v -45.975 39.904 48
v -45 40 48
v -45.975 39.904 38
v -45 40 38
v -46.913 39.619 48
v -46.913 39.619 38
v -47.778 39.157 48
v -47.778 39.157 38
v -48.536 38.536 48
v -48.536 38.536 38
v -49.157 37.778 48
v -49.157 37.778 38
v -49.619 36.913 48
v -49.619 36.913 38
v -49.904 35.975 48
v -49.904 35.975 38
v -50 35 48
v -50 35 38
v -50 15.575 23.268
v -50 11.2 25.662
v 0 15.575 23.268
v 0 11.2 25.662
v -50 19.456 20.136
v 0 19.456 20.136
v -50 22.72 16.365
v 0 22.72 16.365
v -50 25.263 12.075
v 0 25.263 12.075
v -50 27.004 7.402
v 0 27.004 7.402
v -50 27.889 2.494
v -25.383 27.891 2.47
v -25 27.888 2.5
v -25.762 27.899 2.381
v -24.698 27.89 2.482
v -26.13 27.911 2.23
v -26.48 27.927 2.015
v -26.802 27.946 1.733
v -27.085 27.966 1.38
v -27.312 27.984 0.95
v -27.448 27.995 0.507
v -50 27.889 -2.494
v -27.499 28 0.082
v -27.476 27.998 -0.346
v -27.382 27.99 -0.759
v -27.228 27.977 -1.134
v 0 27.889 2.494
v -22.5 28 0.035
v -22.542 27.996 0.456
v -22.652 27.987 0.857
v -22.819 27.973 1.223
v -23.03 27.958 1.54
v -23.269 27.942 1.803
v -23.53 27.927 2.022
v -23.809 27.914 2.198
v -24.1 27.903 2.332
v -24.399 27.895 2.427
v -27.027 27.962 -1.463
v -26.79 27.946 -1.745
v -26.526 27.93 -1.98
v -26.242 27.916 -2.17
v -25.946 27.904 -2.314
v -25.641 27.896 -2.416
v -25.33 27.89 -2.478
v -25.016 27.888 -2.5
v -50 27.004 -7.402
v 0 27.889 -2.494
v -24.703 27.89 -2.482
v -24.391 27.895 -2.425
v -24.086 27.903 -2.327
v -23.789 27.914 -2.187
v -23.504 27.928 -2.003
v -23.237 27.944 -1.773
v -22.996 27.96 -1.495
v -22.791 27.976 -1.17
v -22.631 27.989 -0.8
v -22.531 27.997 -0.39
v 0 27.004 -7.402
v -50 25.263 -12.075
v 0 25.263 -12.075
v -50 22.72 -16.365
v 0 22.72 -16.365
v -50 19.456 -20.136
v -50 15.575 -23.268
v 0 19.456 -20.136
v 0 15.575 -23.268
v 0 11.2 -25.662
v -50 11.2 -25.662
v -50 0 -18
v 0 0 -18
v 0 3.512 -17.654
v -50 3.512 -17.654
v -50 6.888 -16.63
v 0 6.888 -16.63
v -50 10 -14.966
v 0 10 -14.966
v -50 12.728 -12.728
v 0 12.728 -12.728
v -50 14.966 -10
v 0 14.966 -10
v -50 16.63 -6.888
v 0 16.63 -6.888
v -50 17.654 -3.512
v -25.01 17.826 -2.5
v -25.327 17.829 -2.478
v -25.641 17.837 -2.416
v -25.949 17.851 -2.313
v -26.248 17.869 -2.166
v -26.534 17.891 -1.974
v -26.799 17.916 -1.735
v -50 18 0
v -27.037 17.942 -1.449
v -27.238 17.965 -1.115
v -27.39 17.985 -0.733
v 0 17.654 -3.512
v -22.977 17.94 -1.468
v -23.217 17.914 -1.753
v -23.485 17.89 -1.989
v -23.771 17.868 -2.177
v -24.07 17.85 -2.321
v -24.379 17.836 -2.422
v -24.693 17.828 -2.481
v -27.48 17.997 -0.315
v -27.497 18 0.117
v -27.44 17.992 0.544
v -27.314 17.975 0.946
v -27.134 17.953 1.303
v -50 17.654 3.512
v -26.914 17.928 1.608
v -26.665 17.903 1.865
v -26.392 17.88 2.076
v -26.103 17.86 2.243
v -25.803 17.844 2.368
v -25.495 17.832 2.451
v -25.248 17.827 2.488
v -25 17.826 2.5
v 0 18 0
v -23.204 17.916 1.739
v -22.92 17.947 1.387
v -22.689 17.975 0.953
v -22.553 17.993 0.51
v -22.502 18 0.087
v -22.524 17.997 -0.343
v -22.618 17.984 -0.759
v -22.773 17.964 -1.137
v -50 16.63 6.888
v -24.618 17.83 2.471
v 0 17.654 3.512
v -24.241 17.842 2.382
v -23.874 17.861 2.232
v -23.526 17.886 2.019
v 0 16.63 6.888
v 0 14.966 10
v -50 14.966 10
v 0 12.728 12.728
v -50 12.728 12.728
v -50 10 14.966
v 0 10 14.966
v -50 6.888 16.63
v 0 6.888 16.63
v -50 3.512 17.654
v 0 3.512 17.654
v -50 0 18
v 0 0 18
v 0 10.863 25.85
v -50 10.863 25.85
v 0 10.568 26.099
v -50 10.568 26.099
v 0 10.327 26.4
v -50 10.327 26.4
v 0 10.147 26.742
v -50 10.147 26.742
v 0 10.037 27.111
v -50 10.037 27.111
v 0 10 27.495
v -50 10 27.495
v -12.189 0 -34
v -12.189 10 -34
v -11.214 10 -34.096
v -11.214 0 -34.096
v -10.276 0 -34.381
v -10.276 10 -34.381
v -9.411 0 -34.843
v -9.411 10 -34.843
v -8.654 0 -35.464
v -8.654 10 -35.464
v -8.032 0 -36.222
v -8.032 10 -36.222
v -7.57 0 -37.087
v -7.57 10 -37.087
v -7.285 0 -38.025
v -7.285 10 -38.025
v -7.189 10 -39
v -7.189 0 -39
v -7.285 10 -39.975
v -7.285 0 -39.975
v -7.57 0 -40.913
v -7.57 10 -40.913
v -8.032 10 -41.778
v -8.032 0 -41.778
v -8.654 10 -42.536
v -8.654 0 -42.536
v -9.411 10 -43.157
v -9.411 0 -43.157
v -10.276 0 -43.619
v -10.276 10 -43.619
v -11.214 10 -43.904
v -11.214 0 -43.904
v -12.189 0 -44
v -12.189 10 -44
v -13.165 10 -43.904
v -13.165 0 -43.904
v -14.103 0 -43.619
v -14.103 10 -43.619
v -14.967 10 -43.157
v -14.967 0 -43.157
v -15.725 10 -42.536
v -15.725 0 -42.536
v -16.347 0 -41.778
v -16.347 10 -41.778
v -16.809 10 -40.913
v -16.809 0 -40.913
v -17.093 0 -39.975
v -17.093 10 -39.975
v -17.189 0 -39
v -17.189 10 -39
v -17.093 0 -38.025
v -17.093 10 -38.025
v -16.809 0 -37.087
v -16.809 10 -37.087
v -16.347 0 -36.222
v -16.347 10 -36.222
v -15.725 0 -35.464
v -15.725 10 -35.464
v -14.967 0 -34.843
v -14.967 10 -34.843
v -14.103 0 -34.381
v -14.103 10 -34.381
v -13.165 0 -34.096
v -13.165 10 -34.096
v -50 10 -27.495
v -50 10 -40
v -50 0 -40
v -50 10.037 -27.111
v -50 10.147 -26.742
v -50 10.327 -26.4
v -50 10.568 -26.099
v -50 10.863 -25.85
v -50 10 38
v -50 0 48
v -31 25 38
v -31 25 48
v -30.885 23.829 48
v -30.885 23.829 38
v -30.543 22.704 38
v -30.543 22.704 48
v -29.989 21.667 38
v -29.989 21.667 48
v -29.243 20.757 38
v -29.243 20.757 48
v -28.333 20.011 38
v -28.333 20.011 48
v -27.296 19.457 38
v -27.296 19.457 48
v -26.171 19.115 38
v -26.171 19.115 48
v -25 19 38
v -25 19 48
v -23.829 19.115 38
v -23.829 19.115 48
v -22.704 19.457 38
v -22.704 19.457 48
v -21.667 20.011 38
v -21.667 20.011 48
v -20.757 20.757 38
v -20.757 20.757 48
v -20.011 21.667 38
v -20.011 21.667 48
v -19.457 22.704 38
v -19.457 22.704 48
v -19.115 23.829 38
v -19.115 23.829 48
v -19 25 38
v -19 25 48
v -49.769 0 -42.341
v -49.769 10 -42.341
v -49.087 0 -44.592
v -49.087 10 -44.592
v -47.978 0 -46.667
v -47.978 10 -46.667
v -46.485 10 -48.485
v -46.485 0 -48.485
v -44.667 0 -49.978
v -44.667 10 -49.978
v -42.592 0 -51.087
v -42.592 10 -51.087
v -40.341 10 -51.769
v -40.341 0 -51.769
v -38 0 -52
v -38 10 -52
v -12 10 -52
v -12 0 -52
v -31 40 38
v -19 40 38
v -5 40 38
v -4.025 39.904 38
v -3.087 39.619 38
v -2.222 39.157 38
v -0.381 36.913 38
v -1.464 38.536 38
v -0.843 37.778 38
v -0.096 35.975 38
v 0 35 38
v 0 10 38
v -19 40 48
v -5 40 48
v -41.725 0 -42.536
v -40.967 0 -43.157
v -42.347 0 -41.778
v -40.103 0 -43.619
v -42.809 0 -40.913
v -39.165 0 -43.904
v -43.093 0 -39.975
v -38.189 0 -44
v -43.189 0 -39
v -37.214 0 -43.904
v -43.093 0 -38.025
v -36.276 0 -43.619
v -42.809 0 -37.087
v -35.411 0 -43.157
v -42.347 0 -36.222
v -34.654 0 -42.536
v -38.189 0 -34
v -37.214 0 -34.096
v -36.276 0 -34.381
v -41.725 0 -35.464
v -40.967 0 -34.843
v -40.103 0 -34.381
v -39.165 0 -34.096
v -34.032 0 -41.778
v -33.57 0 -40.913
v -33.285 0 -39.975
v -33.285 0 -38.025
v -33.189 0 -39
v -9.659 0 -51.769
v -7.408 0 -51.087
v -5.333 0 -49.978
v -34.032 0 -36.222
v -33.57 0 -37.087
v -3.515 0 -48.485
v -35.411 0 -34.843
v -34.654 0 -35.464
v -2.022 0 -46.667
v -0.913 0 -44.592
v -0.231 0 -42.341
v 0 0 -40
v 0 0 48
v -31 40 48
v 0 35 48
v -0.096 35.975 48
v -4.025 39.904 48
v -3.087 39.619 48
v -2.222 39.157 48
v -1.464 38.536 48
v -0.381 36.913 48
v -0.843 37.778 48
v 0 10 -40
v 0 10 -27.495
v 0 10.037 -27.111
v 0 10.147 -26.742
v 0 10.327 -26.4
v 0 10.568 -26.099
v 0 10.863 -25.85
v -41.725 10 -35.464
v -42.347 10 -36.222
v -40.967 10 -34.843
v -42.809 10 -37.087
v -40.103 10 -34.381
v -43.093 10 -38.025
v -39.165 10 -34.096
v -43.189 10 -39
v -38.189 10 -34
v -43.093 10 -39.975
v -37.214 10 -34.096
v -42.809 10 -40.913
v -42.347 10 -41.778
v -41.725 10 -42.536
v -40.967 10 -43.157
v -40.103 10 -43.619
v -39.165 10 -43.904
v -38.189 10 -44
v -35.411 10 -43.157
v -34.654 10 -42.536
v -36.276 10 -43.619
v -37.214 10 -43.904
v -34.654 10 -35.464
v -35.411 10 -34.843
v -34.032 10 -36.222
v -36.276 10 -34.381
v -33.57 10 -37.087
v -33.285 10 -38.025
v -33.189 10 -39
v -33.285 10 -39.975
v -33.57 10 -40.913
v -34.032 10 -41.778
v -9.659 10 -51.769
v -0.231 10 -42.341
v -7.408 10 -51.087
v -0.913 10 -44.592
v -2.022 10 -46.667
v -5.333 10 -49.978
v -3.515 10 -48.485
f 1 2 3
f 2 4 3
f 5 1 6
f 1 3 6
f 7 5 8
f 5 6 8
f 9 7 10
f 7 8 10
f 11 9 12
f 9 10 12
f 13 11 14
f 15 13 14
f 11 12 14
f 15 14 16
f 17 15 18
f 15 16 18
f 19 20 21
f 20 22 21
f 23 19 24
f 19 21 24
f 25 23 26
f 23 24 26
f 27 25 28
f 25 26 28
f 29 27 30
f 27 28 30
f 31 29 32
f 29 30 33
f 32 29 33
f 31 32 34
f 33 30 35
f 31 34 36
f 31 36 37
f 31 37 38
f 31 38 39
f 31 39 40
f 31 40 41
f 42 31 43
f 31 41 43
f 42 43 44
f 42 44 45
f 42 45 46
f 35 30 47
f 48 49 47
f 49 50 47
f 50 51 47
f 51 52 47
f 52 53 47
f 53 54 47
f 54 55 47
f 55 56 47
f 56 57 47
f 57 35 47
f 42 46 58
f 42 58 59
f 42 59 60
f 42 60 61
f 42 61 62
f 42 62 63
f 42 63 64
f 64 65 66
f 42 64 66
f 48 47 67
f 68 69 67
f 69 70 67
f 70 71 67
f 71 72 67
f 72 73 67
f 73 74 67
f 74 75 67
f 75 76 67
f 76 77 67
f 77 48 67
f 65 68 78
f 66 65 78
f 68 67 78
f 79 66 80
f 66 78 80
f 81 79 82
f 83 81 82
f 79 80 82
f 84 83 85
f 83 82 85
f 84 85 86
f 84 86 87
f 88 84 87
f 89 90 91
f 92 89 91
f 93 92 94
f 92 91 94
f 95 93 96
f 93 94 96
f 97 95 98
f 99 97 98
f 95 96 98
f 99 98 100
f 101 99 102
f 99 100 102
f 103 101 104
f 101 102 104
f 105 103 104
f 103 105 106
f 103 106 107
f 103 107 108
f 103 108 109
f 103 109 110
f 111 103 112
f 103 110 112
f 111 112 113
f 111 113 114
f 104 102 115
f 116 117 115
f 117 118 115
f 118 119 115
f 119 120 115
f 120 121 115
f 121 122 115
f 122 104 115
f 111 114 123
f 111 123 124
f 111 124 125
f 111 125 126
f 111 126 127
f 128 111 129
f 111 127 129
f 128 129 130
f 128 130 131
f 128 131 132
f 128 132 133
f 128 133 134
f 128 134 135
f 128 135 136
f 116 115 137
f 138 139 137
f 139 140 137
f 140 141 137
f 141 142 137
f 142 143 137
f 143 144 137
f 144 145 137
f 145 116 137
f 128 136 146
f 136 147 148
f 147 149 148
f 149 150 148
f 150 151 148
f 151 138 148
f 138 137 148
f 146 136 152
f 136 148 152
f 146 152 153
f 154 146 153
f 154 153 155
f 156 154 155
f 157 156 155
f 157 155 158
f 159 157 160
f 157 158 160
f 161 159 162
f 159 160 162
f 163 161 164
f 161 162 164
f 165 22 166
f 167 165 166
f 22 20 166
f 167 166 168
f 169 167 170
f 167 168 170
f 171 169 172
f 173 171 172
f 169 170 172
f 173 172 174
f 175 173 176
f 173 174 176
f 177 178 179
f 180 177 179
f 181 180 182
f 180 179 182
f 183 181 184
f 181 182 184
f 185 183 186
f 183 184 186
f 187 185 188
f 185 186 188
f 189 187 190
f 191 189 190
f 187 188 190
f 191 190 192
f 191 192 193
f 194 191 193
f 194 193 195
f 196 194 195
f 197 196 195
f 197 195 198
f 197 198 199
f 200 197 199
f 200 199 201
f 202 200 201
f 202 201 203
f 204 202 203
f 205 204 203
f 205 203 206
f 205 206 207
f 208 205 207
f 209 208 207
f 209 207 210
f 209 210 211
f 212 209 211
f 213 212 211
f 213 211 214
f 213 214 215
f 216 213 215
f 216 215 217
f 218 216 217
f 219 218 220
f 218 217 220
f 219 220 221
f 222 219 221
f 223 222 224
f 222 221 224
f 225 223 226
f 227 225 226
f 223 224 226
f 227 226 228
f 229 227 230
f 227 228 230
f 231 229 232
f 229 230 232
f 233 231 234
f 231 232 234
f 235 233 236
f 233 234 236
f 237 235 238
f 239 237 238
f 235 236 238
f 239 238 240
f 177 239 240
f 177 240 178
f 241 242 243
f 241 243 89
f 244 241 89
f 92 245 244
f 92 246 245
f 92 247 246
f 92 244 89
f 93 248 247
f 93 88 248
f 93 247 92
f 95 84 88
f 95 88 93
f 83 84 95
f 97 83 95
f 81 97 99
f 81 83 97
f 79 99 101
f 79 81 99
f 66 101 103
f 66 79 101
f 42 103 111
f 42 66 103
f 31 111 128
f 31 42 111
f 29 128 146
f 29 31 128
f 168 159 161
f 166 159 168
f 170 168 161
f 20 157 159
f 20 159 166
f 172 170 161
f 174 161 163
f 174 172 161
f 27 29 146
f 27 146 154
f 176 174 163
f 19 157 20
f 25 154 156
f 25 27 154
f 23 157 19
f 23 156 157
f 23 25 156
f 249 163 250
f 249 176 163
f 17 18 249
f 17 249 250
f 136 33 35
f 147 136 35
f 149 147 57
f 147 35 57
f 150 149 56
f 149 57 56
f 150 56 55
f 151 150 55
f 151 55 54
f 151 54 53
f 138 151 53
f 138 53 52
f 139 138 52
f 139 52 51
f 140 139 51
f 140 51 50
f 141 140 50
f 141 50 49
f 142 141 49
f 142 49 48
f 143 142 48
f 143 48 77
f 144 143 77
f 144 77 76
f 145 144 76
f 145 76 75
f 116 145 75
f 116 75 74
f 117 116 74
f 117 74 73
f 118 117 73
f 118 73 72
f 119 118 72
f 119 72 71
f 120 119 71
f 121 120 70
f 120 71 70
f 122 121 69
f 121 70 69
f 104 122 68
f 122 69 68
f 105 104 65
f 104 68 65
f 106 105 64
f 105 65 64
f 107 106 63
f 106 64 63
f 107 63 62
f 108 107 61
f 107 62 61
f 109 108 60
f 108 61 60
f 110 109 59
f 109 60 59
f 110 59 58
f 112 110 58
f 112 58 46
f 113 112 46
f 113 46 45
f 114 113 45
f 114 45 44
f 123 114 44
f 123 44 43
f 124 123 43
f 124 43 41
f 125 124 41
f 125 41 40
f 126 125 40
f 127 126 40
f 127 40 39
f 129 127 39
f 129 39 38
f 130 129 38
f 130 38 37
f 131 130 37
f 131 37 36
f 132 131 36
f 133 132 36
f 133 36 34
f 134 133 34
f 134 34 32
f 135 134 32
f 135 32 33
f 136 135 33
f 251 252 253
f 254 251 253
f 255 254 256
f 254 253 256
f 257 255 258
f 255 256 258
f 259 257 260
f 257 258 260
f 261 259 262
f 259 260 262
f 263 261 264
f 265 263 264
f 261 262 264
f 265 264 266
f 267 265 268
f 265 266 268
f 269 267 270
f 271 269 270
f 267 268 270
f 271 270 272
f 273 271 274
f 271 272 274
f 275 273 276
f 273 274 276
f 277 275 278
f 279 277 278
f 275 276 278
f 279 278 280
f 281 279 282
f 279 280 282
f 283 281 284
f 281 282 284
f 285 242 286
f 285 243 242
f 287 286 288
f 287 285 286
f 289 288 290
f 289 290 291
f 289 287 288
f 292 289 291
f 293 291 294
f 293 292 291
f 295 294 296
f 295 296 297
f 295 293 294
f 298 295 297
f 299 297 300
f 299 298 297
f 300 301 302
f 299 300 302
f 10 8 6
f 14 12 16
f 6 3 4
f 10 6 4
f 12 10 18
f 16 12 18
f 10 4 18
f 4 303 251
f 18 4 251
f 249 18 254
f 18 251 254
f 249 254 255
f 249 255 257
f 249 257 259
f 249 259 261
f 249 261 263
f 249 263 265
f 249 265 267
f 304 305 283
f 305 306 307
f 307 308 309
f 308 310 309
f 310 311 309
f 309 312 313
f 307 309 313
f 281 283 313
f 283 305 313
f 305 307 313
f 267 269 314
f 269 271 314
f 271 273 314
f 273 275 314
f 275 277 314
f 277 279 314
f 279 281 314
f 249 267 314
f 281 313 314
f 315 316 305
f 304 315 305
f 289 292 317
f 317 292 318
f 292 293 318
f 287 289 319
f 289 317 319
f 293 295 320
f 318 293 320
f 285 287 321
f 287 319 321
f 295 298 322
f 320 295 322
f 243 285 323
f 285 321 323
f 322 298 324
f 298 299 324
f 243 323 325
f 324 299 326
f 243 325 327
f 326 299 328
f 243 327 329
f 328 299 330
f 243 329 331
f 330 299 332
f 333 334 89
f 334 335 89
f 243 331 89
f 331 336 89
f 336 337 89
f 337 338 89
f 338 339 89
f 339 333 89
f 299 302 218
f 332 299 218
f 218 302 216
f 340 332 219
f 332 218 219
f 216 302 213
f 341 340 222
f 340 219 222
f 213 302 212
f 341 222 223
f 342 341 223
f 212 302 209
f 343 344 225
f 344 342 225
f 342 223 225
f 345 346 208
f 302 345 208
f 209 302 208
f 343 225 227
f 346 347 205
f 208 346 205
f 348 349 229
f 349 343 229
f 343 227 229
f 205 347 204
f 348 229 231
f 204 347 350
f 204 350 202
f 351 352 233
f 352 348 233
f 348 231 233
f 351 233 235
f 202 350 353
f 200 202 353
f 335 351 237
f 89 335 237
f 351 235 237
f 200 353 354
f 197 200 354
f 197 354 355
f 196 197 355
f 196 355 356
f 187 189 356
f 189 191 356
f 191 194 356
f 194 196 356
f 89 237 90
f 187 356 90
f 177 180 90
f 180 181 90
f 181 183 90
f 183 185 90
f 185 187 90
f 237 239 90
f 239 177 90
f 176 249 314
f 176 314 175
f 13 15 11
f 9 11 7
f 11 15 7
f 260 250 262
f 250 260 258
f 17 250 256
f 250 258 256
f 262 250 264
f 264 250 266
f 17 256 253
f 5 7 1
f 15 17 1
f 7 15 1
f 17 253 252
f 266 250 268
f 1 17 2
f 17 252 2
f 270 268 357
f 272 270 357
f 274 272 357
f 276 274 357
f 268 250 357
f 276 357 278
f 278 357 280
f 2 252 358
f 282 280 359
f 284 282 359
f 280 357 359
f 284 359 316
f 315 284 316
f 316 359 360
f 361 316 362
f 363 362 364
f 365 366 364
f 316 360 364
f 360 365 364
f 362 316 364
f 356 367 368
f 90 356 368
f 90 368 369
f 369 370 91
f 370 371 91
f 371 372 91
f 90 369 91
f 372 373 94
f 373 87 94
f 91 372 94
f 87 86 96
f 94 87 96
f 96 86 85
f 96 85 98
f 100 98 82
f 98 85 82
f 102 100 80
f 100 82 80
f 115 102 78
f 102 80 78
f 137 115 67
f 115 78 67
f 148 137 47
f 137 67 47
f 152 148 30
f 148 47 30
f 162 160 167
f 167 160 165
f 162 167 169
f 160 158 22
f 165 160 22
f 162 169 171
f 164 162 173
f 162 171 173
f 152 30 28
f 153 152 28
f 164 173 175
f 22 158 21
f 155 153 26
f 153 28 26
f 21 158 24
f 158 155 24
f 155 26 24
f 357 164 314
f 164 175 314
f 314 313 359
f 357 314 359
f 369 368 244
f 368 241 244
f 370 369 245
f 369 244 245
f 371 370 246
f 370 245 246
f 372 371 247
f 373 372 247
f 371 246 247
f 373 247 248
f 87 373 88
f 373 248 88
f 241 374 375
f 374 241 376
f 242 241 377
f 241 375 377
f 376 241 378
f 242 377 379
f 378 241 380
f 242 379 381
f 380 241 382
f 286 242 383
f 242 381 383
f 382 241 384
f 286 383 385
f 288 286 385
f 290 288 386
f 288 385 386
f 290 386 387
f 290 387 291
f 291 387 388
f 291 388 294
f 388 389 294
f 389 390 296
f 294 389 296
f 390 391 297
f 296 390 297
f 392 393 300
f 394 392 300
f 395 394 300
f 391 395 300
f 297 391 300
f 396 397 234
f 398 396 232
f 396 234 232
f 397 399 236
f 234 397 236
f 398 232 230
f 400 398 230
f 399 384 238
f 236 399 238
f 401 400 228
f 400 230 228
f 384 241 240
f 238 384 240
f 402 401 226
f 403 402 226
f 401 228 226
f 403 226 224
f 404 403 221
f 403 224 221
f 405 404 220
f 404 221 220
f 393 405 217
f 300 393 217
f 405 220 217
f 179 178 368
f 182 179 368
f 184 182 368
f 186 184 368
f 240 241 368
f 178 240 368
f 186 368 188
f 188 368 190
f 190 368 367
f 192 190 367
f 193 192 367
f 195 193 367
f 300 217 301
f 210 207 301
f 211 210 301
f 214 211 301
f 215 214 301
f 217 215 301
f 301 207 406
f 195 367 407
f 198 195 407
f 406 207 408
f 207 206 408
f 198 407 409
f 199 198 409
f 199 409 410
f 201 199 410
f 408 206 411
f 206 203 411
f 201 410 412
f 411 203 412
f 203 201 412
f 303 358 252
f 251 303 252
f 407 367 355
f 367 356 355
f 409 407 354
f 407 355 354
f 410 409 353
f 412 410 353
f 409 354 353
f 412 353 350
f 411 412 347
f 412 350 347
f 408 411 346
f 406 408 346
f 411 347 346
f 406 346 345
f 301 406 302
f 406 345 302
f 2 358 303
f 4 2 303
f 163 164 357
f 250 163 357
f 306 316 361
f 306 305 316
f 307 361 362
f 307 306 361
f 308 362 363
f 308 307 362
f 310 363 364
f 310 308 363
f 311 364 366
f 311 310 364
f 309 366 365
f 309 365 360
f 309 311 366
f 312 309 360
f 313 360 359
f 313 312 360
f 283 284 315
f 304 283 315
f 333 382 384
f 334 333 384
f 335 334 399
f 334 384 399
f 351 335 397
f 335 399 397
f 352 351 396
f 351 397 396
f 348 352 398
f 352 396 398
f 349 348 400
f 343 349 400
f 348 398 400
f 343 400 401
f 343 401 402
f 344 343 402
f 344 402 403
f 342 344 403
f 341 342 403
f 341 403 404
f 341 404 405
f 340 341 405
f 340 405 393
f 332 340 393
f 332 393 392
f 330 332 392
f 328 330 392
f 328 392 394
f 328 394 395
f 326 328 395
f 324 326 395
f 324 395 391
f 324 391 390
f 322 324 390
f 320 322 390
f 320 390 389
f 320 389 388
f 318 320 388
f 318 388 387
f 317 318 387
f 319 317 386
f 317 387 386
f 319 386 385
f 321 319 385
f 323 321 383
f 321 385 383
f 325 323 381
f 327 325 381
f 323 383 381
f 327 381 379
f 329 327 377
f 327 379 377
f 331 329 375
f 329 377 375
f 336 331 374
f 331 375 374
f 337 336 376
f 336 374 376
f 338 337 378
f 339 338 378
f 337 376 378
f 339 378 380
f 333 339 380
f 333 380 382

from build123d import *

# Parameters (mm, degrees)
Y_KSEKLIK_EKSTR_ZYON1_DEPTH = 50
RADYUS1_R                   = 5
KES_EKSTR_ZYON1_DEPTH       = 10
KES_EKSTR_ZYON2_REACH       = 79.382
KES_EKSTR_ZYON2_END_RADIUS  = 18
IZIM4_R                     = 2.5
IZIM5_R                     = 5
KES_EKSTR_ZYON3_DEPTH       = 26
RADYUS2_R                   = 12
RADYUS3_R                   = 2


with BuildPart() as part:
    # Çizim2 → Yükseklik-Ekstrüzyon1 (new body)
    with BuildSketch(Plane(origin=(0, 0, 0), x_dir=(0, 0, -1), z_dir=(1, 0, 0))):
        with BuildLine():
            Line((-18, 0), (-48, 0))
            Line((-48, 0), (-48, 40))
            Line((-48, 40), (-38, 40))
            Line((-38, 40), (-38, 10))
            Line((-38, 10), (-26.153393661, 10))
            ThreePointArc((-26.153393661, 10), (0, 28), (26.153393661, 10))
            Line((26.153393661, 10), (52, 10))
            Line((52, 10), (52, 0))
            Line((52, 0), (28, 0))
            Line((28, 0), (18, 0))
            ThreePointArc((18, 0), (0, 18), (-18, 0))
        make_face()
    extrude(amount=-Y_KSEKLIK_EKSTR_ZYON1_DEPTH)

    # Radyus1
    radyus1_edges = [part.edges().sort_by_distance(p)[0] for p in [
        (0, 40, 43),
        (-50, 40, 43),
    ]]
    fillet(radyus1_edges, radius=RADYUS1_R)

    # Çizim3 → Kes-Ekstrüzyon1 (cut)
    with BuildSketch(Plane.XY.offset(48)):
        with BuildLine():
            Line((-31, 40), (-31, 25))
            ThreePointArc((-31, 25), (-25, 19), (-19, 25))
            Line((-19, 25), (-19, 40))
            Line((-19, 40), (-31, 40))
        make_face()
    extrude(amount=-KES_EKSTR_ZYON1_DEPTH, mode=Mode.SUBTRACT)

    # Kes-Ekstrüzyon2: up to this cylinder (the profile starts outside it)
    kes_ekstr_zyon2_end = Plane(origin=(-25, 0, 0), z_dir=(1, 0, 0)) * Cylinder(KES_EKSTR_ZYON2_END_RADIUS, 195.764, mode=Mode.PRIVATE)
    # Çizim4 → Kes-Ekstrüzyon2 (cut, up to the surface)
    with BuildSketch(Plane(origin=(0, 28, 0), x_dir=(1, 0, 0), z_dir=(0, 1, 0)), mode=Mode.PRIVATE) as kes_ekstr_zyon2_sk1:
        with Locations(Location((-25, 0, 0), (0, 0, 270))):
            Circle(IZIM4_R)
    kes_ekstr_zyon2_tool1 = extrude(kes_ekstr_zyon2_sk1.sketch, amount=-KES_EKSTR_ZYON2_REACH, mode=Mode.PRIVATE) - kes_ekstr_zyon2_end
    add(kes_ekstr_zyon2_tool1.solids().sort_by_distance((-25, 28, 0))[0], mode=Mode.SUBTRACT)

    # Çizim5 → Kes-Ekstrüzyon3 (cut)
    with BuildSketch(Plane(origin=(0, 10, 0), x_dir=(1, 0, 0), z_dir=(0, 1, 0))):
        with Locations(Location((-38.189299203, 39, 0), (0, 0, 270))):
            Circle(IZIM5_R)
        with Locations(Location((-12.189299203, 39, 0), (0, 0, 270))):
            Circle(IZIM5_R)
    extrude(amount=-KES_EKSTR_ZYON3_DEPTH, mode=Mode.SUBTRACT)

    # Radyus2
    radyus2_edges = [part.edges().sort_by_distance(p)[0] for p in [
        (0, 5, -52),
        (-50, 5, -52),
    ]]
    fillet(radyus2_edges, radius=RADYUS2_R)

    # Radyus3
    radyus3_edges = [part.edges().sort_by_distance(p)[0] for p in [
        (-25, 10, 26.153393661),
        (-25, 10, -26.153393661),
    ]]
    fillet(radyus3_edges, radius=RADYUS3_R)


solid = part.part
